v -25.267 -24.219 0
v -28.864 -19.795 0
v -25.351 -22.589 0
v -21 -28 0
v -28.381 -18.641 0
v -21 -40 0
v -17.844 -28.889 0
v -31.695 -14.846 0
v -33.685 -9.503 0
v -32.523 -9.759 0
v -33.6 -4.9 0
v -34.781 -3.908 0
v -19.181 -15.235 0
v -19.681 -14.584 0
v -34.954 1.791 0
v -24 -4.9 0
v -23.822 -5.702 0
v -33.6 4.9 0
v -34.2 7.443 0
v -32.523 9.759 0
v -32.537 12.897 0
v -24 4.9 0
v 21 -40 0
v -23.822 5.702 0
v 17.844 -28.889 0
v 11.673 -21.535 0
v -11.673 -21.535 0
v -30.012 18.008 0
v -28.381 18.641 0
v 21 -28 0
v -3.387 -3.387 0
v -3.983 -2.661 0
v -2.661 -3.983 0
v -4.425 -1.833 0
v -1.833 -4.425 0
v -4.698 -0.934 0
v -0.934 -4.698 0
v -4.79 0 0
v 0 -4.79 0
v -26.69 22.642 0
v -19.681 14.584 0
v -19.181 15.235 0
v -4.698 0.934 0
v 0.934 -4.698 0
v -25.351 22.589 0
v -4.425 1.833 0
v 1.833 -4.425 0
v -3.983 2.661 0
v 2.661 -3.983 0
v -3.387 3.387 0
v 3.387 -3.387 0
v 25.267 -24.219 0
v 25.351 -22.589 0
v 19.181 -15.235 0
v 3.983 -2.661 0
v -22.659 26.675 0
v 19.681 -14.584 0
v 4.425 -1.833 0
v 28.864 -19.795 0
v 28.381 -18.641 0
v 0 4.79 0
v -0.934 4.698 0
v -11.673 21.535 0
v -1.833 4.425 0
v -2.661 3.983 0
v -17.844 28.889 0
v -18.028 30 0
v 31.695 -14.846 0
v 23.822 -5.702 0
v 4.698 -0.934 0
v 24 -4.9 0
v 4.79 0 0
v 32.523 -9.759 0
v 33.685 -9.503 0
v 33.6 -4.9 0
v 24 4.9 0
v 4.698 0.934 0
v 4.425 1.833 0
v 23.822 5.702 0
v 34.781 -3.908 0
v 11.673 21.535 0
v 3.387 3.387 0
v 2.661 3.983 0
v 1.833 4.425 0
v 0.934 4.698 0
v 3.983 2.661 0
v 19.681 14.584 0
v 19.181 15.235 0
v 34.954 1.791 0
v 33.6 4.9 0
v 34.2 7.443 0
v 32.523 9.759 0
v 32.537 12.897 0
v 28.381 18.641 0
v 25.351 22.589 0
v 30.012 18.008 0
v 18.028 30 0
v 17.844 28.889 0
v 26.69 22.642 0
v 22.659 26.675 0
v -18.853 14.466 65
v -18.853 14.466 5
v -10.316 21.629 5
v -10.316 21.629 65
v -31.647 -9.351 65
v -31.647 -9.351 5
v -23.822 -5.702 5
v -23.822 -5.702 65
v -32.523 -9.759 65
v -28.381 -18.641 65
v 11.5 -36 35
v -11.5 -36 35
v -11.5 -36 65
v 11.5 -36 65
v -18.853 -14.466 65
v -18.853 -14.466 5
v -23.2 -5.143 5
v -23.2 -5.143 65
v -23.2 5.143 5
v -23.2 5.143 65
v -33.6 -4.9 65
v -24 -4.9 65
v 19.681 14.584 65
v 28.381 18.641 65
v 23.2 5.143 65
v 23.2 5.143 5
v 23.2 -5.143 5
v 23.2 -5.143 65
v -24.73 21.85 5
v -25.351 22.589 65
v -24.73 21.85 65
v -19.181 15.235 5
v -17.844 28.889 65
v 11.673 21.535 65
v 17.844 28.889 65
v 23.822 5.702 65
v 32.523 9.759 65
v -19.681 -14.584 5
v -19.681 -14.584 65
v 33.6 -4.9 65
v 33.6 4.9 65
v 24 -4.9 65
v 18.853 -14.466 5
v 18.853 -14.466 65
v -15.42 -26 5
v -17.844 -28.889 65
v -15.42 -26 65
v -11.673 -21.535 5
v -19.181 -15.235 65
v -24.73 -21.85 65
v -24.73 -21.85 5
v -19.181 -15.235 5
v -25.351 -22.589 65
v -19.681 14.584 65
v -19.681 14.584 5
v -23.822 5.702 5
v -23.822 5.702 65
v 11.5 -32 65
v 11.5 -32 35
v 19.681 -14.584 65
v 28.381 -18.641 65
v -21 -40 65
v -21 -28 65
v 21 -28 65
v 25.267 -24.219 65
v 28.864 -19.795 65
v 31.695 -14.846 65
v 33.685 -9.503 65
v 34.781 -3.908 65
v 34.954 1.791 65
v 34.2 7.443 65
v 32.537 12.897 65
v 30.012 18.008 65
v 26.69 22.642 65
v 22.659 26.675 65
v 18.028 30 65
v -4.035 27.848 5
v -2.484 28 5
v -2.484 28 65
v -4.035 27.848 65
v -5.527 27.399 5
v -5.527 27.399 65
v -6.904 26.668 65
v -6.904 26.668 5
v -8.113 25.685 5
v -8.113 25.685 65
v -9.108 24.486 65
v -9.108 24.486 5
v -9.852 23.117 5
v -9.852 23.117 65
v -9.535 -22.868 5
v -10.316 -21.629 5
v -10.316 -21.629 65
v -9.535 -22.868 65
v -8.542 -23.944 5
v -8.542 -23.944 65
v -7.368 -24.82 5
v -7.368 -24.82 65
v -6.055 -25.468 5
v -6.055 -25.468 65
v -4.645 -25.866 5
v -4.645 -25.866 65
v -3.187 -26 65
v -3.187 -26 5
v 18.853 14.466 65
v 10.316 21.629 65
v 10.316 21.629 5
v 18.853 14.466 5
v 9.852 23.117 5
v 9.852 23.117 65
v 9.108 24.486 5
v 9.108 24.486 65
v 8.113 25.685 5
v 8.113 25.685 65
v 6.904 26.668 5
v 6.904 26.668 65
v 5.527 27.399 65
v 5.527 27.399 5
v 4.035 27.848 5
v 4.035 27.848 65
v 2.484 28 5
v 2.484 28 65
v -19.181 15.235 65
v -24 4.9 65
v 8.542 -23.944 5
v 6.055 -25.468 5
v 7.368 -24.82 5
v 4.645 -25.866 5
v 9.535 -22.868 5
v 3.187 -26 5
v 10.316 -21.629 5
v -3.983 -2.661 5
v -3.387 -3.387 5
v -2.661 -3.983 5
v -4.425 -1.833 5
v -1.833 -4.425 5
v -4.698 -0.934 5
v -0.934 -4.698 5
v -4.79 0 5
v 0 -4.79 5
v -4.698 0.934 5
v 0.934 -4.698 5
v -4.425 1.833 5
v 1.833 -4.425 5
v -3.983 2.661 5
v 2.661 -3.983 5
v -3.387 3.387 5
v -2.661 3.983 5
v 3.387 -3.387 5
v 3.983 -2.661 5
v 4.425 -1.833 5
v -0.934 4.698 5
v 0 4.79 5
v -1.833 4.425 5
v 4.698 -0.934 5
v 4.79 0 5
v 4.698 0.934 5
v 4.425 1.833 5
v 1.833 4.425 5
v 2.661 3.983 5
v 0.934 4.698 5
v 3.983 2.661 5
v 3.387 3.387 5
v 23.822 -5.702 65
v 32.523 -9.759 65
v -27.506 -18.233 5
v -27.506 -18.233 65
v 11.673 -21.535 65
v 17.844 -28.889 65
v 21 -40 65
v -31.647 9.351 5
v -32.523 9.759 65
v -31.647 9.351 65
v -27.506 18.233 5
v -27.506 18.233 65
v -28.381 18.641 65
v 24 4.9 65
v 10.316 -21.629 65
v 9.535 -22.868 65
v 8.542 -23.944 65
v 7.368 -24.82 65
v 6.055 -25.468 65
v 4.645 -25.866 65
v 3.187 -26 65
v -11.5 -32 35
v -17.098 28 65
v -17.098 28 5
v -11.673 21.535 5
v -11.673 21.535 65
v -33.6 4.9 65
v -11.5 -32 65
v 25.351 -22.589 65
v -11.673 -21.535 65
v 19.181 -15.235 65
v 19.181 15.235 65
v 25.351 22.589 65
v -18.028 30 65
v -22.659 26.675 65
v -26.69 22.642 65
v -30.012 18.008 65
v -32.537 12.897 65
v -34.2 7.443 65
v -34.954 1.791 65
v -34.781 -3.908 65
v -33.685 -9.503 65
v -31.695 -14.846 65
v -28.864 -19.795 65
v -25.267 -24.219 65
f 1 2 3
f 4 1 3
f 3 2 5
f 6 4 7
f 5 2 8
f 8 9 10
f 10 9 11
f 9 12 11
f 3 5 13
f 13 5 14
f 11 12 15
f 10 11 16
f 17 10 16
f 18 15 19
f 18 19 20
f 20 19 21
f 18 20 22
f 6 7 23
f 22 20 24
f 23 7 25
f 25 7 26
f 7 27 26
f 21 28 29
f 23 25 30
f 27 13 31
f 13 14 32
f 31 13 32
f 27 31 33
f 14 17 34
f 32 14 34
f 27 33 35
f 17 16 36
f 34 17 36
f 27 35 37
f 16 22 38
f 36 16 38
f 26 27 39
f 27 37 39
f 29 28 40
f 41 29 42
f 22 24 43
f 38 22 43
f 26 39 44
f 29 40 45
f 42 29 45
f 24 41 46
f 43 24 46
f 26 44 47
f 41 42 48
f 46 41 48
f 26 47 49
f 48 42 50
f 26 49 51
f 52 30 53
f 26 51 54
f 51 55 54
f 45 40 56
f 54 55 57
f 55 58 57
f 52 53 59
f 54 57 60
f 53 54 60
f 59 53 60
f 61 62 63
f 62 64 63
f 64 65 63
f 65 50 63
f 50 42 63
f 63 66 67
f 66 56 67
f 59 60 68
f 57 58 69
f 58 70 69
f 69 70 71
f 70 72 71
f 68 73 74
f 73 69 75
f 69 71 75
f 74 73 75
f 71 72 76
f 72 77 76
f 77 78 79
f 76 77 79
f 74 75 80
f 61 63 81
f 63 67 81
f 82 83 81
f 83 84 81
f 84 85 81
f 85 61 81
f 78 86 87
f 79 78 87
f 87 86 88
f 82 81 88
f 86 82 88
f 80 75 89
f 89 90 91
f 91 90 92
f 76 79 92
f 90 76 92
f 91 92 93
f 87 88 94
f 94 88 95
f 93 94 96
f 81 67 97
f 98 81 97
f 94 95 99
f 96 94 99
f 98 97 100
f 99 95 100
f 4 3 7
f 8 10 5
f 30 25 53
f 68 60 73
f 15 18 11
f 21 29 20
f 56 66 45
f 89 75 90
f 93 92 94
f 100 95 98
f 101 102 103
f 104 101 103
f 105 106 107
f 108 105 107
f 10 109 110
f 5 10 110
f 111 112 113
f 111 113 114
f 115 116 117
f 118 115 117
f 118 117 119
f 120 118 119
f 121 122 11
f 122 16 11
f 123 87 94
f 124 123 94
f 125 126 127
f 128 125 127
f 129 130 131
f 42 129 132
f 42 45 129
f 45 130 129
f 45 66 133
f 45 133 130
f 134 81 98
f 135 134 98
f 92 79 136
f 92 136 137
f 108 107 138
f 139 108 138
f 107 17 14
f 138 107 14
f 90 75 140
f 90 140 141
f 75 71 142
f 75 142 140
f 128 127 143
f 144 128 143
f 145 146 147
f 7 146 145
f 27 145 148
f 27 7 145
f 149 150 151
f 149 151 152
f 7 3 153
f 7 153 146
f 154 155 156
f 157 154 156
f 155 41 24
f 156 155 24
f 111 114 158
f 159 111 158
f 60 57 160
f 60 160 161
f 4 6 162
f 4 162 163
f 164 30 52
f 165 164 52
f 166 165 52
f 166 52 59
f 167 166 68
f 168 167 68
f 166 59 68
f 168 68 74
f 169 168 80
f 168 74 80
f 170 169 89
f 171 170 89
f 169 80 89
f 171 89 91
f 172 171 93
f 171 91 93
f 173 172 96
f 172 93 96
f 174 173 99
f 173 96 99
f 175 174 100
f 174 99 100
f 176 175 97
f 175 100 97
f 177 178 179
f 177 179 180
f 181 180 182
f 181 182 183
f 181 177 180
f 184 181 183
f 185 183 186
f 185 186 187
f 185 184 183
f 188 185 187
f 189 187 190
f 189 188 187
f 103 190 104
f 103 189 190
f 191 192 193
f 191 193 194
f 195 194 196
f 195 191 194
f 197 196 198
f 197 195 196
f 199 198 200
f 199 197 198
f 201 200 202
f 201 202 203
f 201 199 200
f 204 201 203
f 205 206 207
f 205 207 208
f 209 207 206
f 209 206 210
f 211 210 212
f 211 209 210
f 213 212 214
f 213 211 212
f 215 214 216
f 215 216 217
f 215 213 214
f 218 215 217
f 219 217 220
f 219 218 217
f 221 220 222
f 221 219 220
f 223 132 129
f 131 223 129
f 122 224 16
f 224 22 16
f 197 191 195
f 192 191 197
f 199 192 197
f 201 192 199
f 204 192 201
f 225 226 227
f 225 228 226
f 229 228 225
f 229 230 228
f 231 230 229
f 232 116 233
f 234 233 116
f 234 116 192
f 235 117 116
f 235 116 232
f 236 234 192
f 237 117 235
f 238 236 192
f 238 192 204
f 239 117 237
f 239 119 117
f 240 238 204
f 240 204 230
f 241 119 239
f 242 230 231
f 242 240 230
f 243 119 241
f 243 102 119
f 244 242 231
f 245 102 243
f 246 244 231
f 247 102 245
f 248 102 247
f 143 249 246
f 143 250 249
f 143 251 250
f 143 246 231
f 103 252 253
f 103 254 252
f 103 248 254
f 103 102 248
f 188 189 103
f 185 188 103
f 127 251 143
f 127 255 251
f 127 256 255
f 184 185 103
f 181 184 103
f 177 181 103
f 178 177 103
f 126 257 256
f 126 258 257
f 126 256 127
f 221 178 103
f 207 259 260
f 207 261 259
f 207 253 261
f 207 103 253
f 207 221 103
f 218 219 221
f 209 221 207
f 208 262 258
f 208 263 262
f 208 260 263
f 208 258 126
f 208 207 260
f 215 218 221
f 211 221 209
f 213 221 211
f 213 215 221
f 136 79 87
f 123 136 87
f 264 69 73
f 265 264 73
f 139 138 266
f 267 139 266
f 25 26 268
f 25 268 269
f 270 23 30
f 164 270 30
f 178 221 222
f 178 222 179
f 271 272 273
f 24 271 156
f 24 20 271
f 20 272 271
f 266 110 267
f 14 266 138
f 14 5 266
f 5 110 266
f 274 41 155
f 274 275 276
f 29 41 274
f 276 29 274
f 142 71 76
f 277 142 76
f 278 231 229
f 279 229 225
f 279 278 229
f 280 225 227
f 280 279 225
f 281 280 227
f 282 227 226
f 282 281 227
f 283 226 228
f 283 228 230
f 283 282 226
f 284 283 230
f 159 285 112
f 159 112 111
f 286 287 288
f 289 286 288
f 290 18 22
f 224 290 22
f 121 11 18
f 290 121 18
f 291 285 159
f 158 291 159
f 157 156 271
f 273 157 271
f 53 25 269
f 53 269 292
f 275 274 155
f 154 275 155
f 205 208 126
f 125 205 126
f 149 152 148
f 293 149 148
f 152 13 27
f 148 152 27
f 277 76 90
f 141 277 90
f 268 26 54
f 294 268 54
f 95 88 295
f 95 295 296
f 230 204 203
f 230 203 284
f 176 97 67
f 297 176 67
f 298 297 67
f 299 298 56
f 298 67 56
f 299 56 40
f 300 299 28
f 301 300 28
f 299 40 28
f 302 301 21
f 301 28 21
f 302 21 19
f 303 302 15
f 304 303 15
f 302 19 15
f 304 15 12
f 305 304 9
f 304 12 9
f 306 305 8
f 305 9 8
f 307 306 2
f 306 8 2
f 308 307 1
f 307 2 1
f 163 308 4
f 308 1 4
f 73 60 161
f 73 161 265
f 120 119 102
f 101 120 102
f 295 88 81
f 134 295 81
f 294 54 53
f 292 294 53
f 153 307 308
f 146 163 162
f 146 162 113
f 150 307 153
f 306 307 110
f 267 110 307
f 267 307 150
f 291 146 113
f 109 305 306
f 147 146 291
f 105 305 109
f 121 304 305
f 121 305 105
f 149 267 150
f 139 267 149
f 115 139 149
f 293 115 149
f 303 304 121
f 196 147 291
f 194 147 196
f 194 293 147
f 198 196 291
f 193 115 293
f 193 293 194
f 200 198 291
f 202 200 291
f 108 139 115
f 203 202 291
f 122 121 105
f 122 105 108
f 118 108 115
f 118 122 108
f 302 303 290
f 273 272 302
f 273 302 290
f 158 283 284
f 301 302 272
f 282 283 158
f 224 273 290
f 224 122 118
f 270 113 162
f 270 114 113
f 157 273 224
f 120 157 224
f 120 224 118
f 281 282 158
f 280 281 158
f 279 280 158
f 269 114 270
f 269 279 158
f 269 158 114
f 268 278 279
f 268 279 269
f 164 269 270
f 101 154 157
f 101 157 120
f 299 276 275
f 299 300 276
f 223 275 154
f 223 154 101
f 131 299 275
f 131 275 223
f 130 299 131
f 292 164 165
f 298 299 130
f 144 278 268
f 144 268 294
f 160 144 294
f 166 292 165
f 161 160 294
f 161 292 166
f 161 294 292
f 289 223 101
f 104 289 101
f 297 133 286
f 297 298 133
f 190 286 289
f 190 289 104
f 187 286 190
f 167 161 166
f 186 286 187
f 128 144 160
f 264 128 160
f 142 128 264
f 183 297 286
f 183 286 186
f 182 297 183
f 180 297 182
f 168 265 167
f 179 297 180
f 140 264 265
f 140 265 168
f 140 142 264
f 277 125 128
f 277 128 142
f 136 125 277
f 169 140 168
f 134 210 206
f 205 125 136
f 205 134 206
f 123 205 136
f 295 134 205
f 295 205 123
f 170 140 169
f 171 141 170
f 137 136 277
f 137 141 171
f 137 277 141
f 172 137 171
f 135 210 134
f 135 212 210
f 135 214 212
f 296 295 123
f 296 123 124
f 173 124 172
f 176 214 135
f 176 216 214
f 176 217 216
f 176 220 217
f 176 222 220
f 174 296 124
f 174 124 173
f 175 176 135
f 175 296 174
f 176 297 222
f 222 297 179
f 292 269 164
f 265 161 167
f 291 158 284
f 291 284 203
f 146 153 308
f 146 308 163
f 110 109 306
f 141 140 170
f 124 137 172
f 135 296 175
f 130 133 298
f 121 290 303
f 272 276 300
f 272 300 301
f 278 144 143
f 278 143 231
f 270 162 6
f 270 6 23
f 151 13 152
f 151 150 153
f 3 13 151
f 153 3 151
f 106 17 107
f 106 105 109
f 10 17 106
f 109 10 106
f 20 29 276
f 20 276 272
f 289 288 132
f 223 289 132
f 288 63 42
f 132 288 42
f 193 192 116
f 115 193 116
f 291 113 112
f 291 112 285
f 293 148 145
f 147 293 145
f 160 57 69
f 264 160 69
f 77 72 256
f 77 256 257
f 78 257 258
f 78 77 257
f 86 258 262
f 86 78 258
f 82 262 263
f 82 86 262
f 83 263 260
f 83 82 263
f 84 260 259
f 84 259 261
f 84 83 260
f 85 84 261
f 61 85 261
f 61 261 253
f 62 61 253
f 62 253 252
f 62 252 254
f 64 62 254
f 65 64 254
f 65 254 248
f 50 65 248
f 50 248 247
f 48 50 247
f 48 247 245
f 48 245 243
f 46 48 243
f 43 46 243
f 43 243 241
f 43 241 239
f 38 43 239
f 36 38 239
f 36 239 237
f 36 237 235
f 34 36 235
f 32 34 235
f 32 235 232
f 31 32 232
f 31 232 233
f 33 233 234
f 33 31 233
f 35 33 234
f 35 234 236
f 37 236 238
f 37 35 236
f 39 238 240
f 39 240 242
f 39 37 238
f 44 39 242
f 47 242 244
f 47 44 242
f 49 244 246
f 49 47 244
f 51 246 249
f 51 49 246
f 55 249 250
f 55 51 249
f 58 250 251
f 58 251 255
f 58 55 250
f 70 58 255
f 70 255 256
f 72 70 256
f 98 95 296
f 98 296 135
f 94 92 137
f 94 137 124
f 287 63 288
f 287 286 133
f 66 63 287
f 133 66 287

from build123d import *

# Parameters (mm, degrees)
SKETCH2_R                       = 4.79
BOSS_EXTRUDE2_DEPTH             = 65
SHELL4_START                    = 5
SHELL4_OUTLINE_R                = 4.79
SHELL4_DEPTH                    = 60
SKETCH3_W                       = 42
SKETCH3_H                       = 12
BOSS_EXTRUDE3_DEPTH             = 65
SKETCH4_W                       = 23
SKETCH4_H                       = 4
CUT_EXTRUDE1_DEPTH              = 30
BOSS_EXTRUDE4_DEPTH             = 60
CIRPATTERN2_COUNT               = 3
CIRPATTERN2_ANGLE               = 50
CIRPATTERN2_THE_OTHER_WAY_COUNT = 3
CIRPATTERN2_THE_OTHER_WAY_ANGLE = 50
CUT_EXTRUDE2_START              = -5
SKETCH5_4_W                     = 9.6
SKETCH5_4_H                     = 9.8
CUT_EXTRUDE2_DEPTH              = 65
CIRPATTERN3_COUNT               = 3
CIRPATTERN3_ANGLE               = 50
CIRPATTERN3_THE_OTHER_WAY_COUNT = 3
CIRPATTERN3_THE_OTHER_WAY_ANGLE = 50
MIRROR1_OUTLINE_W               = 9.6
MIRROR1_OUTLINE_H               = 9.8
MIRROR1_DEPTH                   = 65
MIRROR1_START                   = 5
MIRROR1_2_DEPTH                 = 60
FILLET1_R                       = 8


# Read off the part's stored shape, not the designer's step: Shell4, Mirror1
with BuildPart() as part:
    # Sketch2 → Boss-Extrude2 (new body)
    with BuildSketch(Plane.XY):
        with BuildLine():
            Line((18.027756377, 30), (-18.027756377, 30))
            ThreePointArc((-18.027756377, 30), (-34.954133403, 1.791244829), (-21, -28))
            Line((-21, -28), (21, -28))
            ThreePointArc((21, -28), (34.954133403, 1.791244829), (18.027756377, 30))
        make_face()
        Circle(SKETCH2_R, mode=Mode.SUBTRACT)
    extrude(amount=BOSS_EXTRUDE2_DEPTH)

    # Shell4 outline → Shell4 (cut)
    with BuildSketch(Plane.XY.offset(SHELL4_START)):
        with BuildLine():
            ThreePointArc((-17.464249197, 28), (-32.953872935, 1.744207141), (-20.322401433, -26))
            Line((-20.322401433, -26), (20.322401433, -26))
            ThreePointArc((20.322401433, -26), (32.953872935, 1.744207141), (17.464249197, 28))
            Line((17.464249197, 28), (-17.464249197, 28))
        make_face()
        Circle(SHELL4_OUTLINE_R, mode=Mode.SUBTRACT)
    extrude(amount=SHELL4_DEPTH, mode=Mode.SUBTRACT)

    # Sketch3 → Boss-Extrude3 (add)
    with BuildSketch(Plane.XY.offset(65)):
        with Locations((0, -34)):
            Rectangle(SKETCH3_W, SKETCH3_H)
    extrude(amount=-BOSS_EXTRUDE3_DEPTH)

    # Sketch4 → Cut-Extrude1 (cut)
    with BuildSketch(Plane.XY.offset(65)):
        with Locations((0, -34)):
            Rectangle(SKETCH4_W, SKETCH4_H)
    extrude(amount=-CUT_EXTRUDE1_DEPTH, mode=Mode.SUBTRACT)

    # Sketch5 → Boss-Extrude4 (add)
    with BuildSketch(Plane.XY.offset(5)):
        with BuildLine():
            Line((24, 0), (23.2, 0))
            Line((23.2, 0), (23.2, -6))
            Line((23.2, -6), (32.136427928, -7.5))
            ThreePointArc((32.136427928, -7.5), (32.411387807, -6.204993184), (32.634184531, -4.9))
            Line((32.634184531, -4.9), (24, -4.9))
            Line((24, -4.9), (24, 0))
        make_face()
        with BuildLine():
            Line((23.2, 6), (23.2, 0))
            Line((23.2, 0), (24, 0))
            Line((24, 0), (24, 4.9))
            Line((24, 4.9), (32.634184531, 4.9))
            ThreePointArc((32.634184531, 4.9), (32.411387807, 6.204993184), (32.136427928, 7.5))
            Line((32.136427928, 7.5), (23.2, 6))
        make_face()
        with BuildLine():
            Line((33, 0), (24, 0))
            Line((24, 0), (24, -4.9))
            Line((24, -4.9), (32.634184531, -4.9))
            ThreePointArc((32.634184531, -4.9), (32.908419056, -2.456818113), (33, 0))
        make_face()
        with BuildLine():
            Line((24, 4.9), (24, 0))
            Line((24, 0), (33, 0))
            ThreePointArc((33, 0), (32.908419056, 2.456818113), (32.634184531, 4.9))
            Line((32.634184531, 4.9), (24, 4.9))
        make_face()
    boss_extrude4 = extrude(amount=BOSS_EXTRUDE4_DEPTH)

    # CirPattern2: Boss-Extrude4 ×3 about axis
    cirpattern2_axis = Axis((0, 0, 0), (0, 0, -1))
    for i in range(1, CIRPATTERN2_COUNT):
        add(boss_extrude4.rotate(cirpattern2_axis, i * CIRPATTERN2_ANGLE / (CIRPATTERN2_COUNT - 1)))

    # CirPattern2 the other way: Boss-Extrude4 ×3 about axis
    cirpattern2_the_other_way_axis = Axis((0, 0, 0), (0, 0, 1))
    for i in range(1, CIRPATTERN2_THE_OTHER_WAY_COUNT):
        add(boss_extrude4.rotate(cirpattern2_the_other_way_axis, i * CIRPATTERN2_THE_OTHER_WAY_ANGLE / (CIRPATTERN2_THE_OTHER_WAY_COUNT - 1)))

    # Sketch5<4> → Cut-Extrude2 (cut)
    with BuildSketch(Plane.XY.offset(5).offset(CUT_EXTRUDE2_START)):
        with Locations((28.8, 0)):
            Rectangle(SKETCH5_4_W, SKETCH5_4_H)
    cut_extrude2 = extrude(amount=CUT_EXTRUDE2_DEPTH, mode=Mode.SUBTRACT)

    # CirPattern3: Cut-Extrude2 ×3 about axis
    cirpattern3_axis = Axis((0, 0, 0), (0, 0, 1))
    for i in range(1, CIRPATTERN3_COUNT):
        add(cut_extrude2.rotate(cirpattern3_axis, i * CIRPATTERN3_ANGLE / (CIRPATTERN3_COUNT - 1)), mode=Mode.SUBTRACT)

    # CirPattern3 the other way: Cut-Extrude2 ×3 about axis
    cirpattern3_the_other_way_axis = Axis((0, 0, 0), (0, 0, -1))
    for i in range(1, CIRPATTERN3_THE_OTHER_WAY_COUNT):
        add(cut_extrude2.rotate(cirpattern3_the_other_way_axis, i * CIRPATTERN3_THE_OTHER_WAY_ANGLE / (CIRPATTERN3_THE_OTHER_WAY_COUNT - 1)), mode=Mode.SUBTRACT)

    # Mirror1 outline → Mirror1 (cut)
    with BuildSketch(Plane.XY):
        with Locations((-28.8, 0)):
            Rectangle(MIRROR1_OUTLINE_W, MIRROR1_OUTLINE_H)
        Polygon((-19.680557406, 14.583746438), (-28.381112162, 18.640881751), (-32.522771127, 9.759065438), (-23.822216371, 5.701930125), align=None)
        Polygon((-28.381112162, -18.640881751), (-19.680557406, -14.583746438), (-23.822216371, -5.701930125), (-32.522771127, -9.759065438), align=None)
        Polygon((-11.673284861, 21.534725922), (-17.844045914, 28.888752576), (-25.351281457, 22.589434001), (-19.180520404, 15.235407347), align=None)
        Polygon((-17.844045914, -28.888752576), (-11.673284861, -21.534725922), (-19.180520404, -15.235407347), (-25.351281457, -22.589434001), align=None)
    extrude(amount=MIRROR1_DEPTH, mode=Mode.SUBTRACT)

    # Mirror1 2 outline → Mirror1 2 (add)
    with BuildSketch(Plane.XY.offset(MIRROR1_START)):
        with BuildLine():
            ThreePointArc((-31.647445046, 9.350894183), (-32.217768235, 7.14250726), (-32.63418453, 4.9))
            Line((-32.63418453, 4.9), (-24, 4.9))
            Line((-24, 4.9), (-24, -4.9))
            Line((-24, -4.9), (-32.63418453, -4.9))
            ThreePointArc((-32.63418453, -4.9), (-32.217768234, -7.14250726), (-31.647445046, -9.350894183))
            Line((-31.647445046, -9.350894183), (-23.822216371, -5.701930125))
            Line((-23.822216371, -5.701930125), (-19.680557406, -14.583746438))
            Line((-19.680557406, -14.583746438), (-27.505786081, -18.232710496))
            ThreePointArc((-27.505786081, -18.232710496), (-26.18066023, -20.089127157), (-24.73046724, -21.849576428))
            Line((-24.73046724, -21.849576428), (-19.180520404, -15.235407347))
            Line((-19.180520404, -15.235407347), (-11.673284861, -21.534725922))
            Line((-11.673284861, -21.534725922), (-15.420094693, -26))
            Line((-15.420094693, -26), (-12.888229067, -26))
            Line((-12.888229067, -26), (-10.316405886, -21.628956738))
            Line((-10.316405886, -21.628956738), (-18.852681319, -14.466171171))
            Line((-18.852681319, -14.466171171), (-23.2, -5.143316173))
            Line((-23.2, -5.143316173), (-23.2, 5.143316173))
            Line((-23.2, 5.143316173), (-18.852681319, 14.466171171))
            Line((-18.852681319, 14.466171171), (-10.316405886, 21.628956738))
            Line((-10.316405886, 21.628956738), (-14.064983918, 28))
            Line((-14.064983918, 28), (-17.098293955, 28))
            Line((-17.098293955, 28), (-11.673284861, 21.534725922))
            Line((-11.673284861, 21.534725922), (-19.180520404, 15.235407347))
            Line((-19.180520404, 15.235407347), (-24.73046724, 21.849576428))
            ThreePointArc((-24.73046724, 21.849576428), (-26.18066023, 20.089127157), (-27.505786081, 18.232710496))
            Line((-27.505786081, 18.232710496), (-19.680557406, 14.583746438))
            Line((-19.680557406, 14.583746438), (-23.822216371, 5.701930125))
            Line((-23.822216371, 5.701930125), (-31.647445046, 9.350894183))
        make_face()
    extrude(amount=MIRROR1_2_DEPTH)

    # Fillet1
    # the kernel refuses this fillet: 8 mm, written as the material it adds along each edge
    with BuildSketch(Plane(origin=(14.064983918, 28, 5), x_dir=(-0.507111132951345, -0.8618806755211555, 0), z_dir=(0, 0, 1))) as fillet1_piece_1:
        with BuildLine():
            CenterArc((12.767888624, -5.924532666), FILLET1_R, 132.220297842, 78.251296778)
            Line((5.87284322, -9.98142173), (5.734942312, -10.062559511))
            Line((5.734942312, -10.062559511), (-0.137900908, -0.081137781))
            Line((-0.137900908, -0.081137781), (0, 0.16))
            ThreePointArc((0, 0.16), (3.696012361, 0.16), (7.284507445, 0.118490653))
            Line((7.284507445, 0.118490653), (7.392024723, 0))
        make_face()
    extrude(amount=60)
    with BuildSketch(Plane(origin=(-12.888229067, -26, 5), x_dir=(0.5071111329155005, 0.8618806755422457, 0), z_dir=(0, 0, 1))) as fillet1_piece_2:
        with BuildLine():
            CenterArc((11.814726499, -4.304548479), FILLET1_R, 147.447746104, 63.023848513)
            Line((4.919681094, -8.361437543), (4.781780186, -8.442575324))
            Line((4.781780186, -8.442575324), (-0.137900908, -0.081137781))
            Line((-0.137900908, -0.081137781), (0, 0.16))
            ThreePointArc((0, 0.16), (2.535758943, 0.16), (4.936653714, 0.08609097))
            Line((4.936653714, 0.08609097), (5.071517886, 0))
        make_face()
    extrude(amount=60)
    with BuildSketch(Plane(origin=(-14.064983918, 28, 5), x_dir=(1, 0, 0), z_dir=(0, 0, 1))) as fillet1_piece_3:
        with BuildLine():
            CenterArc((11.580978682, -8), FILLET1_R, 90, 78.251296781)
            Line((3.748578032, -6.371043262), (3.591930019, -6.338464127))
            ThreePointArc((3.591930019, -6.338464127), (1.736388108, -3.266659412), (-0.137900908, -0.081137781))
            Line((-0.137900908, -0.081137781), (0, 0.16))
            Line((0, 0.16), (11.580978682, 0.16))
            Line((11.580978682, 0.16), (11.580978682, 0))
        make_face()
    extrude(amount=60)
    with BuildSketch(Plane(origin=(12.888229067, -26, 65), x_dir=(-1, 0, 0), z_dir=(0, 0, -1))) as fillet1_piece_4:
        with BuildLine():
            CenterArc((9.701386491, 8), FILLET1_R, 206.97615149, 63.02384851)
            Line((2.571823181, 4.371043262), (2.429231915, 4.298464127))
            ThreePointArc((2.429231915, 4.298464127), (1.148010682, 2.266659412), (-0.137900908, 0.081137781))
            Line((-0.137900908, 0.081137781), (0, -0.16))
            Line((0, -0.16), (9.701386491, -0.16))
            Line((9.701386491, -0.16), (9.701386491, 0))
        make_face()
    extrude(amount=60)


solid = part.part
